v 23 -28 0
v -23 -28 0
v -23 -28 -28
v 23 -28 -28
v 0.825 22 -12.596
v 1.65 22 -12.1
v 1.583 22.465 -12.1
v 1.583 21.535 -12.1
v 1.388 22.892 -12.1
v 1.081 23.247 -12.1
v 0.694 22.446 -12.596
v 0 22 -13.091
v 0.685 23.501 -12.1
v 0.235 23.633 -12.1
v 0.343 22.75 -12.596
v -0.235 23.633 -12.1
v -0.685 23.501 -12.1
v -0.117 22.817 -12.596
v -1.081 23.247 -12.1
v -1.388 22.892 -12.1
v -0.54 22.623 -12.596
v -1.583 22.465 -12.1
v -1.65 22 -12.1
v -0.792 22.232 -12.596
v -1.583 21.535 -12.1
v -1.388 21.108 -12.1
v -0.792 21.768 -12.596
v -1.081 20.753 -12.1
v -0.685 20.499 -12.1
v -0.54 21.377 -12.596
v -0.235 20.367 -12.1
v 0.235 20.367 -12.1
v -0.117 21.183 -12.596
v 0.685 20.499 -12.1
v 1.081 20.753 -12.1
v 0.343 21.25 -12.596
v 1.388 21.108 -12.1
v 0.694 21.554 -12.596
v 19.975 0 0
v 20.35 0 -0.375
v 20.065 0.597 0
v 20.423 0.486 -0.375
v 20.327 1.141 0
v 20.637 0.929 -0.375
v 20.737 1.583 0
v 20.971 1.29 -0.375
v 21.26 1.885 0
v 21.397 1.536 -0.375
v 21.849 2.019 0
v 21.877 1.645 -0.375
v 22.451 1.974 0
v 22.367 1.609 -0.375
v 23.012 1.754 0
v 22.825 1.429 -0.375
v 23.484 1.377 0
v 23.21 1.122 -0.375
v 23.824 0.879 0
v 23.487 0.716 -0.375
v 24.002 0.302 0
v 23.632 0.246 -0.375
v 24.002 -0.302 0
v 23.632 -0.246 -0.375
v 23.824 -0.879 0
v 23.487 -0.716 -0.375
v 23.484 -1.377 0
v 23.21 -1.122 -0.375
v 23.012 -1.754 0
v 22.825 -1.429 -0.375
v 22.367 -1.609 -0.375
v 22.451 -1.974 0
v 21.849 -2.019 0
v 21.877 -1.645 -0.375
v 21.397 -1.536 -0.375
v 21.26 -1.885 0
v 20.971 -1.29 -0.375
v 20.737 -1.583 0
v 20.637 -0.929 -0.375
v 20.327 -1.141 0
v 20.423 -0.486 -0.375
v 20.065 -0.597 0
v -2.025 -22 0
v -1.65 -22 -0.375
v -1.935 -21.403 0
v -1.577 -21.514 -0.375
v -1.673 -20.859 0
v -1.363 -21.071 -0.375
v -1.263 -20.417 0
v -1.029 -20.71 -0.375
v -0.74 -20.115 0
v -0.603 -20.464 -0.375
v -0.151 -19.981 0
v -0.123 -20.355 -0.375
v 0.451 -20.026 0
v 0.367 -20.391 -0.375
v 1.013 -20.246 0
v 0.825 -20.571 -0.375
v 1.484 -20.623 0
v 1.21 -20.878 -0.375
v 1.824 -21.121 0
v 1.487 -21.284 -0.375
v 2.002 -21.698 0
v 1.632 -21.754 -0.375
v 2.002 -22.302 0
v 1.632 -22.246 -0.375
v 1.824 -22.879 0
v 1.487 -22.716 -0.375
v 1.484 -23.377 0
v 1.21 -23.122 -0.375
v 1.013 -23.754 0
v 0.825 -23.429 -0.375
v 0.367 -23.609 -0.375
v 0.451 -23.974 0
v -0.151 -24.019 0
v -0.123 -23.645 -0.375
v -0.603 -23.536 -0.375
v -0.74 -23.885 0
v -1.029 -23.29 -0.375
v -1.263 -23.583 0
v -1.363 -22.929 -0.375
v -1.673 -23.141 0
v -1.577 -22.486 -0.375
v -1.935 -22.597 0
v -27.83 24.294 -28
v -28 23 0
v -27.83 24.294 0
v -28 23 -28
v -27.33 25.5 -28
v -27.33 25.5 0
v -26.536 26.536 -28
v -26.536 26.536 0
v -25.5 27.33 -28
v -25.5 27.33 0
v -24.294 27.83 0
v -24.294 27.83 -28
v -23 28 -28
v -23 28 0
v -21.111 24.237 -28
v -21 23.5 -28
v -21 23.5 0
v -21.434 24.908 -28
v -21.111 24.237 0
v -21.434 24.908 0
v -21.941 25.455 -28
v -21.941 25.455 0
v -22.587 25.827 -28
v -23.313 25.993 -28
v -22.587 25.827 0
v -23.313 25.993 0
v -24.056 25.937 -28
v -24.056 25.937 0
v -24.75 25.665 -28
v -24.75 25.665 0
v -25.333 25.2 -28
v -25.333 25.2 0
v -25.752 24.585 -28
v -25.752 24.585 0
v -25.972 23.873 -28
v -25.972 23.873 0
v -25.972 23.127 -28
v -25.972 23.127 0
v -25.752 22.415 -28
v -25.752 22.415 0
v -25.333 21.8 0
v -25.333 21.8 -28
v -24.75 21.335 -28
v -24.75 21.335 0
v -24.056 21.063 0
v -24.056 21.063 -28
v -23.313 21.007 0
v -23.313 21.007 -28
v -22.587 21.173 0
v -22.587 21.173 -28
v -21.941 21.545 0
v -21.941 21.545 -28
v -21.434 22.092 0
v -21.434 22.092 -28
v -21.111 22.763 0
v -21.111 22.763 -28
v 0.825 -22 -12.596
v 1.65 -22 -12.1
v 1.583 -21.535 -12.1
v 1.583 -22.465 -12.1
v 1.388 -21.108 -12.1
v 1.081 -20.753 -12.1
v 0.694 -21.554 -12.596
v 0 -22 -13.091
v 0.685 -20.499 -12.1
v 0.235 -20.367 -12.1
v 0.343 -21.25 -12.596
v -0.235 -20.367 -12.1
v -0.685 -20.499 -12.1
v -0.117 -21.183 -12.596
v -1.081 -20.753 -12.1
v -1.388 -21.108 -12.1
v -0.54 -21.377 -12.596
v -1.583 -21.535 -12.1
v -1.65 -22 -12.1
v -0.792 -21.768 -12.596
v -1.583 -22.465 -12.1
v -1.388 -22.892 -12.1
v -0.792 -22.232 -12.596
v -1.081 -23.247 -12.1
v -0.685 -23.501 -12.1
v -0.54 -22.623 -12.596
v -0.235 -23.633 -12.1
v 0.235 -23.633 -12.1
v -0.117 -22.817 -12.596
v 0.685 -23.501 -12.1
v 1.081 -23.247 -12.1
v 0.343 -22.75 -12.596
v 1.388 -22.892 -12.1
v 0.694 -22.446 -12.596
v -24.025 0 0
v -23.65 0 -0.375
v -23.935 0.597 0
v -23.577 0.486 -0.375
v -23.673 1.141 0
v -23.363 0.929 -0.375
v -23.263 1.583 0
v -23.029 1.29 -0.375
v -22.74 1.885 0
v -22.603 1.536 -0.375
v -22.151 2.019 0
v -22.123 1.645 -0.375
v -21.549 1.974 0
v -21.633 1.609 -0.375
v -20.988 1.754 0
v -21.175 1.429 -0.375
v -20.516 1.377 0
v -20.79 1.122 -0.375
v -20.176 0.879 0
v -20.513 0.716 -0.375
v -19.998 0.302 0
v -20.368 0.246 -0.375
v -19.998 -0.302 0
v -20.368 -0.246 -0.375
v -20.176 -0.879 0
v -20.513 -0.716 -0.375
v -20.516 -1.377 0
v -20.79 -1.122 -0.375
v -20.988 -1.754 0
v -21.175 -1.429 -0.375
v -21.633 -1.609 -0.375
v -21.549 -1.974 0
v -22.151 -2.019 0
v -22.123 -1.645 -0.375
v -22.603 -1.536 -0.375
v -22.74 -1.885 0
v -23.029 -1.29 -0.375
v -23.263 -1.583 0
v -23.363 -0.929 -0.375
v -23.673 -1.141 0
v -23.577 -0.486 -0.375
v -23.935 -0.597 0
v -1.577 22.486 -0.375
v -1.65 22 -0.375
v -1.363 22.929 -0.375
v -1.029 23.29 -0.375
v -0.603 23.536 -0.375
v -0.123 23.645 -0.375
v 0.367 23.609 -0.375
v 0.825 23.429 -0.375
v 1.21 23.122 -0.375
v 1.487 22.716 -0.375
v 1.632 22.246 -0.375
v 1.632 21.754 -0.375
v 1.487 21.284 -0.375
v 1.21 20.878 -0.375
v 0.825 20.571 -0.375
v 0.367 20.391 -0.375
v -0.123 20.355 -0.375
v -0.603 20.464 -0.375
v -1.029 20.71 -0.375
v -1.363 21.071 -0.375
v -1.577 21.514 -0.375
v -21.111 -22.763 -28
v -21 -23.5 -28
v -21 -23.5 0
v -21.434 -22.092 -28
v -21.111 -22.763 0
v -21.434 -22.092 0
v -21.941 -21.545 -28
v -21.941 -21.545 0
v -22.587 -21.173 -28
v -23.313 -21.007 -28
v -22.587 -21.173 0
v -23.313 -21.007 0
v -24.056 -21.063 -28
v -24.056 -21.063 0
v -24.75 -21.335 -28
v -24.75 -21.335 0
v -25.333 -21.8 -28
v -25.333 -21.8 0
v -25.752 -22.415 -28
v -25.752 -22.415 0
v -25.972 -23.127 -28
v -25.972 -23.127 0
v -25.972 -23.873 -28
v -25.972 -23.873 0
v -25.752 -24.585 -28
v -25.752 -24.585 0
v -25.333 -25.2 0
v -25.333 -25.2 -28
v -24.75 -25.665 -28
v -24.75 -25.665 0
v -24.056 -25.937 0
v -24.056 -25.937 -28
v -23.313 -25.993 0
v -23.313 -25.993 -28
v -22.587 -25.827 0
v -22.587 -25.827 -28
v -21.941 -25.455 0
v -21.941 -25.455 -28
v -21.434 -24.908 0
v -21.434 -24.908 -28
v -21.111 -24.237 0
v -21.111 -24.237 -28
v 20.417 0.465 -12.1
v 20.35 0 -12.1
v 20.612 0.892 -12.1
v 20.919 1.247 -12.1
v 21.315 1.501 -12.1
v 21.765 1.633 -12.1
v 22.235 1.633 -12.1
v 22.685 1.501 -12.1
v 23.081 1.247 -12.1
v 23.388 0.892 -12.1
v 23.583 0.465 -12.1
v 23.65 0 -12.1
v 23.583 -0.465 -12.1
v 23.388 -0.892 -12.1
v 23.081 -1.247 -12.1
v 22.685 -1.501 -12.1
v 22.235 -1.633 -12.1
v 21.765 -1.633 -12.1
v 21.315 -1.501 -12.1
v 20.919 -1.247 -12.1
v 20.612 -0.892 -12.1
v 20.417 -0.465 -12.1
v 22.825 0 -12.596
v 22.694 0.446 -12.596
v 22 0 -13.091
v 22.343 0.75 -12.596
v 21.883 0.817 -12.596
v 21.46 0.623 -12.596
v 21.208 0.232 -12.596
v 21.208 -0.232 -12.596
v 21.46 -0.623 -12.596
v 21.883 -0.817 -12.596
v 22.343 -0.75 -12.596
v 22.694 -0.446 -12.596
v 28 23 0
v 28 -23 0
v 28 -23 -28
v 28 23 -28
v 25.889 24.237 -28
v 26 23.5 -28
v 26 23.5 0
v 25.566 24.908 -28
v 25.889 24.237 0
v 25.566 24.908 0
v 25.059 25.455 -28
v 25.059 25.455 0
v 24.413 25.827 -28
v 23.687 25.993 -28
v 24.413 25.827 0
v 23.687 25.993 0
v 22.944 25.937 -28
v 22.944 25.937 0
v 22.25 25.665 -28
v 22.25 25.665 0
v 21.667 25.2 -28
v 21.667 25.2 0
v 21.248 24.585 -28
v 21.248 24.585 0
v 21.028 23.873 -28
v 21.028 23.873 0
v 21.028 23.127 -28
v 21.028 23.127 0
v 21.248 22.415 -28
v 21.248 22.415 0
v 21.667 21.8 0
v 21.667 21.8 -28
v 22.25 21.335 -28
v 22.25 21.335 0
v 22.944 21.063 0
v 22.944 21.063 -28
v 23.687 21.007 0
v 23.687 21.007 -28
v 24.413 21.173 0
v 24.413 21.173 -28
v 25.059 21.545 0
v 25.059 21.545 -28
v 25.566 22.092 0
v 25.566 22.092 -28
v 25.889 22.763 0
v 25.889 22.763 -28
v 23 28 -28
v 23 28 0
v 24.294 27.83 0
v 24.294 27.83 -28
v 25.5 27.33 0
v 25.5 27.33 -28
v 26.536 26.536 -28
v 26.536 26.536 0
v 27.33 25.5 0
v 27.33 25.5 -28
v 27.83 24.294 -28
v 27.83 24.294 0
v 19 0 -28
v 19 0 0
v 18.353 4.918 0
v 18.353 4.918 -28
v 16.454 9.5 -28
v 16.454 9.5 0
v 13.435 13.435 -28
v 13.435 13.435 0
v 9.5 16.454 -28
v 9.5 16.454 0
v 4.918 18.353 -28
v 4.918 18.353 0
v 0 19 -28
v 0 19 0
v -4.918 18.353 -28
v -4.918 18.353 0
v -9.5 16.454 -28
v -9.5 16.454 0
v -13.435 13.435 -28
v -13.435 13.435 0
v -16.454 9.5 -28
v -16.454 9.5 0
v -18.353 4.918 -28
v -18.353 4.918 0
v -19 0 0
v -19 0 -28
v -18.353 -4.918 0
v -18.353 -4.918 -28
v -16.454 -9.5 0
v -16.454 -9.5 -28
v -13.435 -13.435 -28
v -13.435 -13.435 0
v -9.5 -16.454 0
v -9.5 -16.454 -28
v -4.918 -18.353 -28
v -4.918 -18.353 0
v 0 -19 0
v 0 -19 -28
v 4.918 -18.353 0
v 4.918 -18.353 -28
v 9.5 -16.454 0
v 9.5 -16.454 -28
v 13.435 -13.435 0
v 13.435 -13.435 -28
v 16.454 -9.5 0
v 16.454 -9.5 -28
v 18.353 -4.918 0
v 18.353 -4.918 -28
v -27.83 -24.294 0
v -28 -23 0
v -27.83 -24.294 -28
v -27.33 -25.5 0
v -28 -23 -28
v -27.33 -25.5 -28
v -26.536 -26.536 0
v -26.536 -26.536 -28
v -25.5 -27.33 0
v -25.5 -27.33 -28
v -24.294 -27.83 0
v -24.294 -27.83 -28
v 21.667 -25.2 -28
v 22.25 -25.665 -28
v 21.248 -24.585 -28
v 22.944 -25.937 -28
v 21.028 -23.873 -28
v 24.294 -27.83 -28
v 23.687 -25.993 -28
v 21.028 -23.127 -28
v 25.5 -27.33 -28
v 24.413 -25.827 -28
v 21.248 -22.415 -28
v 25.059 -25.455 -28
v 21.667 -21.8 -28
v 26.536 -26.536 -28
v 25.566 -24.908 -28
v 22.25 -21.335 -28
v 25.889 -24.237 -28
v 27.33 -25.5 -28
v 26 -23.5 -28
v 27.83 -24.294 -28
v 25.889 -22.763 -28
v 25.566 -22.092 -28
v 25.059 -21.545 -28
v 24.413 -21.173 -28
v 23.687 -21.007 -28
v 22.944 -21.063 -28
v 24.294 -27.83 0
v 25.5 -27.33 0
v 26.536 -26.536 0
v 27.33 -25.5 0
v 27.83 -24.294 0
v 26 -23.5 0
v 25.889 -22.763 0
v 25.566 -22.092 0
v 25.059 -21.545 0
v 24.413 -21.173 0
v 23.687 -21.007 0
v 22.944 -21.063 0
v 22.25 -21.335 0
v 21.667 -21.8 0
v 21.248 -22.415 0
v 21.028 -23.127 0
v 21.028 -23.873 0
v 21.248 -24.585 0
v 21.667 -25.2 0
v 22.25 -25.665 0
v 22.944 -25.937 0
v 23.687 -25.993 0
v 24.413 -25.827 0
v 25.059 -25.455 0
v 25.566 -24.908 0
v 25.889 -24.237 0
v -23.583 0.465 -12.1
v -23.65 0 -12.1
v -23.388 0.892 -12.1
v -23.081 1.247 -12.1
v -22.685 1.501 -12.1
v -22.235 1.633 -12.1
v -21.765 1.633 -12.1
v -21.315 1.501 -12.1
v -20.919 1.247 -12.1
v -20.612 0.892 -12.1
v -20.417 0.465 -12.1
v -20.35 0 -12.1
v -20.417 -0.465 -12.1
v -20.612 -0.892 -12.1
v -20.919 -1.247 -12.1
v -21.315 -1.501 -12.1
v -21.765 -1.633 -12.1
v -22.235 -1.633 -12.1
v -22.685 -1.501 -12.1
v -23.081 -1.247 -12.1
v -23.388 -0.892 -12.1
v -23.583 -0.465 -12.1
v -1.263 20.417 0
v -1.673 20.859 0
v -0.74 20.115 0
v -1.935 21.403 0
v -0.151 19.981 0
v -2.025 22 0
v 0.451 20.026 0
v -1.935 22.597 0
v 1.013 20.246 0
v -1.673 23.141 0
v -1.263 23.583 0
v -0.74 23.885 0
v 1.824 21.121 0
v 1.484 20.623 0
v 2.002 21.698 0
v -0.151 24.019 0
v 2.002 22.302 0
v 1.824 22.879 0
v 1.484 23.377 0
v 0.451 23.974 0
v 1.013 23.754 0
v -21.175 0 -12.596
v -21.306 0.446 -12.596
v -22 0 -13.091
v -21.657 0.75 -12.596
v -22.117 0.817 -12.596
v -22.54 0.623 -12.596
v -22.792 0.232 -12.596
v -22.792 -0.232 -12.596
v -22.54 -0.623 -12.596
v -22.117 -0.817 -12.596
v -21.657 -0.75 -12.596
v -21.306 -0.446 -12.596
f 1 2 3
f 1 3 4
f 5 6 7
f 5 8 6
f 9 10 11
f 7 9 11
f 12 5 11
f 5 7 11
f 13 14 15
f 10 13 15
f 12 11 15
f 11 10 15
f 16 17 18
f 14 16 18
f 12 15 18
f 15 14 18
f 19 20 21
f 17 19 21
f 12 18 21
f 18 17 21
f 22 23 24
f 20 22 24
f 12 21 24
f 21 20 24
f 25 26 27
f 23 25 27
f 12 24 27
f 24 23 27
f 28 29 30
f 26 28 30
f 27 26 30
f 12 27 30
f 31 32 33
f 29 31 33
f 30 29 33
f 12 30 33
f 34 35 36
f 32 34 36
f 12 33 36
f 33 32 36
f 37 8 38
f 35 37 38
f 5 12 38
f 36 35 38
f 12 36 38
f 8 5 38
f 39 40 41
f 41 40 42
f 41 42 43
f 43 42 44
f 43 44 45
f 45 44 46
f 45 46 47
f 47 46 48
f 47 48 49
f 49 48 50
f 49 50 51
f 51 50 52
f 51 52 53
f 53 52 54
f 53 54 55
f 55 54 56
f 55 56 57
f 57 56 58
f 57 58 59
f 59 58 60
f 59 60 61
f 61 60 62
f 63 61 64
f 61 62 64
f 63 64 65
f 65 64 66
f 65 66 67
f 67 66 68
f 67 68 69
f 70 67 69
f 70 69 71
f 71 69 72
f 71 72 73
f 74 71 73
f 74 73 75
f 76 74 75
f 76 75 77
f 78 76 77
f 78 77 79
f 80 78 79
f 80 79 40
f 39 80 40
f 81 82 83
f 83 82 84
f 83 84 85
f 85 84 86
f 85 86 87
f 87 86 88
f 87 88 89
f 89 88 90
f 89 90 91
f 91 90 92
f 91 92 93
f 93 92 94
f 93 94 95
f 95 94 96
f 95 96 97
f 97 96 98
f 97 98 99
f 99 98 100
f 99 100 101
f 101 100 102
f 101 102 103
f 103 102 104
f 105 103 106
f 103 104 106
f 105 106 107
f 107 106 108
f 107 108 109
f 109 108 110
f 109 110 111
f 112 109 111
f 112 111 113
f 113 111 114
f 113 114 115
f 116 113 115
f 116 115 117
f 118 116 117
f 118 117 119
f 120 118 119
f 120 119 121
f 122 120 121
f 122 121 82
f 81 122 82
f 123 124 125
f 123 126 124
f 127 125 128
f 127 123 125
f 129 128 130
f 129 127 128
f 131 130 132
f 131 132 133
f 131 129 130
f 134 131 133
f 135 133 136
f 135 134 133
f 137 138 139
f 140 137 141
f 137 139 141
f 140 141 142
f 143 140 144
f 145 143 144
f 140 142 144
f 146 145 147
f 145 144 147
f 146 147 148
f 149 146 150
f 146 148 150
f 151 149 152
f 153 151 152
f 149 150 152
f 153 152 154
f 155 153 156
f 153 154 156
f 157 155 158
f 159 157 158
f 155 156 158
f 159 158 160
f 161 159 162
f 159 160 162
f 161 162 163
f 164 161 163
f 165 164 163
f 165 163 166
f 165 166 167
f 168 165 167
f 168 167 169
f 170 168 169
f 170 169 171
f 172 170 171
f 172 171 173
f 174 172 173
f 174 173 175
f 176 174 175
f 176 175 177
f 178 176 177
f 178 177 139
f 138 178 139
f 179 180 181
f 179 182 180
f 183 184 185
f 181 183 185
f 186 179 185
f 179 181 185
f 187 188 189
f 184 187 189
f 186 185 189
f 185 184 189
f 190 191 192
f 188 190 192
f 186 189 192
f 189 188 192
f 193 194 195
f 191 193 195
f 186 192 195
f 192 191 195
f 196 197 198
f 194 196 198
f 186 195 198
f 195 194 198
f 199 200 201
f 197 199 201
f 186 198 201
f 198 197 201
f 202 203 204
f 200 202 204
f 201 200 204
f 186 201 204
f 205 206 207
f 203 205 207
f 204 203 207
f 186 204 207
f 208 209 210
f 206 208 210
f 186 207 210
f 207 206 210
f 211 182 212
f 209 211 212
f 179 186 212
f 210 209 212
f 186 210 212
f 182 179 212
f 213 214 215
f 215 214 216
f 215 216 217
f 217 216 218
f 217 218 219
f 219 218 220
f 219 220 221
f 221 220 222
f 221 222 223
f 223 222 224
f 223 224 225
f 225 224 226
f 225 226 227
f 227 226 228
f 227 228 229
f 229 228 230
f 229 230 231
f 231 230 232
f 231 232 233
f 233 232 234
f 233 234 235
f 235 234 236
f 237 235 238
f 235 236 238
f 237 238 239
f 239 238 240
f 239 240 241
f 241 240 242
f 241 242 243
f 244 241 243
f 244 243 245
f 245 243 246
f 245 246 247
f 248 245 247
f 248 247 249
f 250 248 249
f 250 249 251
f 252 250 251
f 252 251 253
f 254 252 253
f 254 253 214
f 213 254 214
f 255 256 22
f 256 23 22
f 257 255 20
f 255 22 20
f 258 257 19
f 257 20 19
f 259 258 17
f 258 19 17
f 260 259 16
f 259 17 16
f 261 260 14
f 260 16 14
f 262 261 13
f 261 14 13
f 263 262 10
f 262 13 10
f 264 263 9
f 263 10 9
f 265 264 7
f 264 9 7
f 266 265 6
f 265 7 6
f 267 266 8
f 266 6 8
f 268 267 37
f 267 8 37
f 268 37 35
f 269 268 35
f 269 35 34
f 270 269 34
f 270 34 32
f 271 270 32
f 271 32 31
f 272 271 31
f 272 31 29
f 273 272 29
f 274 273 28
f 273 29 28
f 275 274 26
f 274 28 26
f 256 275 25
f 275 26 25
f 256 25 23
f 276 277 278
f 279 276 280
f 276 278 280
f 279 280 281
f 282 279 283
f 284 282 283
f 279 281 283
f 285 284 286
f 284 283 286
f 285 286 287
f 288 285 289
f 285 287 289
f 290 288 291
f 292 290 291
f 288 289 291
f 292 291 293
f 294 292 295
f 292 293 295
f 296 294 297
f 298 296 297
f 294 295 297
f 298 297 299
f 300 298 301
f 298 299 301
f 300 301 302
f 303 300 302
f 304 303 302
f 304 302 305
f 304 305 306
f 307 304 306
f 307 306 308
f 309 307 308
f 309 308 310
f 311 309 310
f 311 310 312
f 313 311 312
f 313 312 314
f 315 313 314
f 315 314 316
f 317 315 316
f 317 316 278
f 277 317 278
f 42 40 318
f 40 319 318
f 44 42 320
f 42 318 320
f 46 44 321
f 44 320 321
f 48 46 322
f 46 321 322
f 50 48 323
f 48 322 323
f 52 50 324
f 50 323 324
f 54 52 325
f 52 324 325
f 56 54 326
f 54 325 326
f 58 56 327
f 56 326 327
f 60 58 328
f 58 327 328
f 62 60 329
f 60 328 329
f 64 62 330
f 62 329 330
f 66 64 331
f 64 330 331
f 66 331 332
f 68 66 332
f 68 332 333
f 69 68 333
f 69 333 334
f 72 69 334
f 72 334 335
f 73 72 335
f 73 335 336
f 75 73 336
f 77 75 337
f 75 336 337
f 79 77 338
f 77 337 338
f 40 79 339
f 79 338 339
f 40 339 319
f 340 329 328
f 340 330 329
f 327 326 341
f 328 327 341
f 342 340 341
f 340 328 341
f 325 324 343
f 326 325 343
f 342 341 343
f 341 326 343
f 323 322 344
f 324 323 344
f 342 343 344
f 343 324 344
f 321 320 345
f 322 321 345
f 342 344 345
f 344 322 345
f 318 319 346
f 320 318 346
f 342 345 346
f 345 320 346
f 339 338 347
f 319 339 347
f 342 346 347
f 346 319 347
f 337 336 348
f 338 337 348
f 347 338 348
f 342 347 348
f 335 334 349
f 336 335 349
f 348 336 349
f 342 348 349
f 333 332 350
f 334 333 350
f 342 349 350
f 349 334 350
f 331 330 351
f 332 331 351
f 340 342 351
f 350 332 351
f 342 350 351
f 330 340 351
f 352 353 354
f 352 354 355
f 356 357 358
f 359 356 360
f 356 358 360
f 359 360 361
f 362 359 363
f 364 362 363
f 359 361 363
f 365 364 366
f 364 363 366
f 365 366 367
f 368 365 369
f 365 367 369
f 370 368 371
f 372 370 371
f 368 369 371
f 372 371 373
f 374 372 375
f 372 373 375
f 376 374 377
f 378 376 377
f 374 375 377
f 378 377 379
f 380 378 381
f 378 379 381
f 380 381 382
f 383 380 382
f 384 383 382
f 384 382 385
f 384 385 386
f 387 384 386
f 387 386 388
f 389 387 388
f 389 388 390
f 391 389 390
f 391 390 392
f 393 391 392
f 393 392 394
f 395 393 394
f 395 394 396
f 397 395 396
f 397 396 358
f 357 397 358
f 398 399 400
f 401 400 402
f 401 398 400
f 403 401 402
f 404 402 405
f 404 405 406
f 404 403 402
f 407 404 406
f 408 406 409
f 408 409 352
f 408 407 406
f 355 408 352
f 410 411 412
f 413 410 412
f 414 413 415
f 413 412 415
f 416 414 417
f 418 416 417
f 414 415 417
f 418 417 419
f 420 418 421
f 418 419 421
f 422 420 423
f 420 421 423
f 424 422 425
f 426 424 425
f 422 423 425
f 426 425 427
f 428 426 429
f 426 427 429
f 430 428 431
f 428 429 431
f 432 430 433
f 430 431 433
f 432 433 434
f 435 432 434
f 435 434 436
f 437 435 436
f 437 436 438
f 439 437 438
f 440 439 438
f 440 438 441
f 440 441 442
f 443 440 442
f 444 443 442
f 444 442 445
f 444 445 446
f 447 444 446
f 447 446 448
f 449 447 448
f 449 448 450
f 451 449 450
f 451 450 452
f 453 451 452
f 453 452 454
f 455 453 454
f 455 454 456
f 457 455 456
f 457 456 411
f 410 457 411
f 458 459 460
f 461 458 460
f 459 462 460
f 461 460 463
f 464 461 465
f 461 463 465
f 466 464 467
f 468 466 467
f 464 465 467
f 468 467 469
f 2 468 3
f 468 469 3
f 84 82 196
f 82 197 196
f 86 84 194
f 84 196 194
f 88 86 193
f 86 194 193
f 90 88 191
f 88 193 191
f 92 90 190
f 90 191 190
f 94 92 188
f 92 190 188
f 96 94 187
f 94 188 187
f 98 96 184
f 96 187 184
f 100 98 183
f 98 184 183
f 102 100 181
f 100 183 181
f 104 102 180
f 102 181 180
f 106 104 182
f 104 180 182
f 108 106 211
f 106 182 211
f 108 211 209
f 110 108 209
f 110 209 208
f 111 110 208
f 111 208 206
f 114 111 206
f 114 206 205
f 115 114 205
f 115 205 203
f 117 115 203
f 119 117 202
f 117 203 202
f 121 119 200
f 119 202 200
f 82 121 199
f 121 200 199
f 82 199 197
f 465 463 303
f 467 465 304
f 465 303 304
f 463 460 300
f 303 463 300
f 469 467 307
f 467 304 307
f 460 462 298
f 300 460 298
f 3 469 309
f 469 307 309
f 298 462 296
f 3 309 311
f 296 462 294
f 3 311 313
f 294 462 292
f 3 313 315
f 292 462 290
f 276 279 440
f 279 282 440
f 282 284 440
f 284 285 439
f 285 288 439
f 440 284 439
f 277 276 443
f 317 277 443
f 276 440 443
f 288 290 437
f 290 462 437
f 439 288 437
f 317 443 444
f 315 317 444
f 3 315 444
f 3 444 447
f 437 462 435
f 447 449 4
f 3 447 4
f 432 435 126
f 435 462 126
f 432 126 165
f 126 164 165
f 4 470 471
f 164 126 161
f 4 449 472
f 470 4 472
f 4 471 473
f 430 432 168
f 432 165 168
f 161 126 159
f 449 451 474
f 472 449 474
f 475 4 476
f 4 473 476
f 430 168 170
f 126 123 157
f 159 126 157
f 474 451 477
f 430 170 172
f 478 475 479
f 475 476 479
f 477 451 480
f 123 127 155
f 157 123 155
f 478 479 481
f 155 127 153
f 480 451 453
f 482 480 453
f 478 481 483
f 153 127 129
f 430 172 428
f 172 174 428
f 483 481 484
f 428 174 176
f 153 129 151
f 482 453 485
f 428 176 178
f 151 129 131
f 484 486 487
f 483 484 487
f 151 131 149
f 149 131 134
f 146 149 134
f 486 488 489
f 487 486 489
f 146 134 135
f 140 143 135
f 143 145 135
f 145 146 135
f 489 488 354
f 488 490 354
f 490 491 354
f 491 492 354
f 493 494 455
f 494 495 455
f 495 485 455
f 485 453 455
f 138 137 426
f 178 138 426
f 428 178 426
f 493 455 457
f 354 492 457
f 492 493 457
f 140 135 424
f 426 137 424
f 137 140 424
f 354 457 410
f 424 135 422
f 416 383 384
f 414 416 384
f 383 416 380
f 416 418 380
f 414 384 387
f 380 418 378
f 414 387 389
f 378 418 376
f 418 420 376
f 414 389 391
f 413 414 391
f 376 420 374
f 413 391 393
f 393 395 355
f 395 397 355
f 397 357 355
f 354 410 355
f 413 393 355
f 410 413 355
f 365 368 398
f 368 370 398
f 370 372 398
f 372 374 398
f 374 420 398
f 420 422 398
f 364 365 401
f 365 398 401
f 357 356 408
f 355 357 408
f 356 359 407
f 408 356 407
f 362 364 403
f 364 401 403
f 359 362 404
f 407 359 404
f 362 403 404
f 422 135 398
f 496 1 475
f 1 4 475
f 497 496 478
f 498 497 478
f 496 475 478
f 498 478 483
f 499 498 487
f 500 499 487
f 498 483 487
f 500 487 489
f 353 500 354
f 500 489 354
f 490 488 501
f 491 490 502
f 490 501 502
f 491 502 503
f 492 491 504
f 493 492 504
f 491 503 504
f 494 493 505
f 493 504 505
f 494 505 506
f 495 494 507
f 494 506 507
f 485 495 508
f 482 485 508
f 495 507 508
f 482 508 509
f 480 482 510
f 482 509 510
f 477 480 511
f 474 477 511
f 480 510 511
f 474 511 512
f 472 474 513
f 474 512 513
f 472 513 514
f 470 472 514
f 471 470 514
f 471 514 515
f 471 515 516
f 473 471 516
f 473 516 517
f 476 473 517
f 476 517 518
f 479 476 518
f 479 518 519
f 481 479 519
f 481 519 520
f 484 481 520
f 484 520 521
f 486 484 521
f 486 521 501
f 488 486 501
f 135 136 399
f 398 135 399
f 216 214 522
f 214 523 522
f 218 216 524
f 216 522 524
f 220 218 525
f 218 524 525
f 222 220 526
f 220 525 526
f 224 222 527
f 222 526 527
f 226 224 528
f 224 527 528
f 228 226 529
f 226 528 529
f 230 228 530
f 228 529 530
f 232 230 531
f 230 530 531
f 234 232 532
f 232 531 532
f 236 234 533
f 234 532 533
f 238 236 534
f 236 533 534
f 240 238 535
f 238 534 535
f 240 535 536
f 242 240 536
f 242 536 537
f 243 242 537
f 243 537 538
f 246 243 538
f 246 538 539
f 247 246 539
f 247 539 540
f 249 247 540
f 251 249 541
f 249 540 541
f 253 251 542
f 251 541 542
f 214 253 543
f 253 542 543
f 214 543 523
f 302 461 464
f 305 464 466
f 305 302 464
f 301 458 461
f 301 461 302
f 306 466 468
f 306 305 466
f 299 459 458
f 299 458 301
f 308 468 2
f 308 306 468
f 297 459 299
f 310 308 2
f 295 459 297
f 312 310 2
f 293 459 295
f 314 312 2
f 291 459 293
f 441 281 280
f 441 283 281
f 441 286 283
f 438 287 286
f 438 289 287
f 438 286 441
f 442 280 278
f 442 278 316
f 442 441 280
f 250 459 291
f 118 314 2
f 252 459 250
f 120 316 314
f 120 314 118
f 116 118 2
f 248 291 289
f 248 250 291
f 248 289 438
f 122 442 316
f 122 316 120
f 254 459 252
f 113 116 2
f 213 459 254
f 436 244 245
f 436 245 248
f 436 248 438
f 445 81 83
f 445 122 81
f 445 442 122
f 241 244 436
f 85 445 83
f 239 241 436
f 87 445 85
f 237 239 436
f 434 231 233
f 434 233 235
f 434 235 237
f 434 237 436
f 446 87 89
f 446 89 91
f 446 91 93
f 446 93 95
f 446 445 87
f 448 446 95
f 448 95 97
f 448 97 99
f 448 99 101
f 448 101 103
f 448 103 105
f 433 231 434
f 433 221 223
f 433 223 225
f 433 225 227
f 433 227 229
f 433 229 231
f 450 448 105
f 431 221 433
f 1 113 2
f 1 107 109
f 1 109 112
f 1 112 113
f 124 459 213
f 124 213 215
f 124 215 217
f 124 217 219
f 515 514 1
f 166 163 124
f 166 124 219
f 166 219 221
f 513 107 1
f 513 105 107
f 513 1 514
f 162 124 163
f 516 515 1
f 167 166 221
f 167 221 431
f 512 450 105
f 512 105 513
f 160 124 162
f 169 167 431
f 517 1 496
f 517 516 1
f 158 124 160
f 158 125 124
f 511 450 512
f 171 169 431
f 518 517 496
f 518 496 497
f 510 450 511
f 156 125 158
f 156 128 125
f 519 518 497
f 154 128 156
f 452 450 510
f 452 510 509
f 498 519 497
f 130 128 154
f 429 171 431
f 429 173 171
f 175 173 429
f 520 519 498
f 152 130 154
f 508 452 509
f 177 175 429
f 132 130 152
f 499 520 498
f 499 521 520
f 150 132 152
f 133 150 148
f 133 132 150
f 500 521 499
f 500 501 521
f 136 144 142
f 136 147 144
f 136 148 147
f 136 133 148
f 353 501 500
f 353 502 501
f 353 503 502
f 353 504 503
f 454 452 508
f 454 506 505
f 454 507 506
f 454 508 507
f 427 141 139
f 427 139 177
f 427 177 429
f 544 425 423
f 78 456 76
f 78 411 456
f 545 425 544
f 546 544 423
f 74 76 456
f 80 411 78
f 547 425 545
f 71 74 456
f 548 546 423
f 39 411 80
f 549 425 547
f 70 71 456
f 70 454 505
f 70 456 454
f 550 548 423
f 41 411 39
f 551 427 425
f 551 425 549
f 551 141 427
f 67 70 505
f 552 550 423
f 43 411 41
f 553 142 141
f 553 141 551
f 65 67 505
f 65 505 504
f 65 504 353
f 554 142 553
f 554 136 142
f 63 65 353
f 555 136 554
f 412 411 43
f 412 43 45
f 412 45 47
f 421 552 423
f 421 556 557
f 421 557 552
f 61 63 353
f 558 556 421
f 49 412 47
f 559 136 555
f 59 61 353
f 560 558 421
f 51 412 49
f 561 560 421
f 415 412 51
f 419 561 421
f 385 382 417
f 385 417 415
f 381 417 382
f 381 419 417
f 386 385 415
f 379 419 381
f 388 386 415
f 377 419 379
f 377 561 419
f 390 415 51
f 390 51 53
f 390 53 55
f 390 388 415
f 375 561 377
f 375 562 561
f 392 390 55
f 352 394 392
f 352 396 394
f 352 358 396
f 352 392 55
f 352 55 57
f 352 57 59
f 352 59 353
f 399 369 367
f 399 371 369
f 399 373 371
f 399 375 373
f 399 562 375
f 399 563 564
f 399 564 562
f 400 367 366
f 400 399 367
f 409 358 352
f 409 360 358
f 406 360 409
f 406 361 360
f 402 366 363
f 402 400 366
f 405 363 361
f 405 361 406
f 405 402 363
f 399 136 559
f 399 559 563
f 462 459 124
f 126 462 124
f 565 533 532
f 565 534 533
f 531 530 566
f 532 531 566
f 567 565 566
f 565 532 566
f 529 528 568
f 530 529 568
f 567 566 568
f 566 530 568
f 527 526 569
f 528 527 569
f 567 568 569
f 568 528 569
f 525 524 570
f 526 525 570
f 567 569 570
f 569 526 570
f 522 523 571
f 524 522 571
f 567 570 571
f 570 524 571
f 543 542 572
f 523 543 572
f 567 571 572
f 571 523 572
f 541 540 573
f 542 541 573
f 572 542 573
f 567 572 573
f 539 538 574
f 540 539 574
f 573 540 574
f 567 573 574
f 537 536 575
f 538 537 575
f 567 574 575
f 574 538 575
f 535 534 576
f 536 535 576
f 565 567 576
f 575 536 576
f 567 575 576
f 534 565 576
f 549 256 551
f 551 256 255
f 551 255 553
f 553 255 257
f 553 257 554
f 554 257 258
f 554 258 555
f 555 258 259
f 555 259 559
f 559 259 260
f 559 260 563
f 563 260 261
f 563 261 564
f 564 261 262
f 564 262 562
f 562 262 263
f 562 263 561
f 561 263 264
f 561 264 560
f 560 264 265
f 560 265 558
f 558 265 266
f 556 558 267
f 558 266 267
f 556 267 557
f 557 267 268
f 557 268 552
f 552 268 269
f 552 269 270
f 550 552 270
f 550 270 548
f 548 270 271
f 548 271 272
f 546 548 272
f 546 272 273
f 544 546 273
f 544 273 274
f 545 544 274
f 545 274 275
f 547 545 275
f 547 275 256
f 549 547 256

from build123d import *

# Parameters (mm, degrees)
SKETCH1_W                       = 56
SKETCH1_H                       = 56
BASE_FLANGE1_DEPTH              = 28
SKETCH6_R                       = 19
SKETCH6_R_2                     = 2.5
CUT_EXTRUDE1_DEPTH              = 49.497422612
FILLET1_R                       = 5
M4X0_7_TAPPED_HOLE1_D           = 3.3
M4X0_7_TAPPED_HOLE1_DEPTH       = 12.1
M4X0_7_TAPPED_HOLE1_CSINK_D     = 4.05
M4X0_7_TAPPED_HOLE1_CSINK_ANGLE = 90
M4X0_7_TAPPED_HOLE1_TIP         = 0.991420021


# Sheet-metal steps are written as plain solids
with BuildPart() as part:
    # Sketch1 → Base-Flange1 (new body)
    with BuildSketch(Plane.XY):
        Rectangle(SKETCH1_W, SKETCH1_H)
    extrude(amount=-BASE_FLANGE1_DEPTH)

    # Sketch6 → Cut-Extrude1 (cut, through all)
    with BuildSketch(Plane.XY):
        Circle(SKETCH6_R)
        with Locations((-23.5, 23.5)):
            Circle(SKETCH6_R_2)
        with Locations((23.5, 23.5)):
            Circle(SKETCH6_R_2)
        with Locations((23.5, -23.5)):
            Circle(SKETCH6_R_2)
        with Locations((-23.5, -23.5)):
            Circle(SKETCH6_R_2)
    extrude(amount=-CUT_EXTRUDE1_DEPTH, mode=Mode.SUBTRACT)

    # Fillet1
    fillet1_edges = [part.edges().sort_by_distance(p)[0] for p in [
        (28, -28, -14),
        (-28, -28, -14),
        (-28, 28, -14),
        (28, 28, -14),
    ]]
    fillet(fillet1_edges, radius=FILLET1_R)

    # M4x0.7 Tapped Hole1
    with Locations(Plane.XY):
        with Locations((0, 22), (-22, 0), (0, -22), (22, 0)):
            CounterSinkHole(M4X0_7_TAPPED_HOLE1_D / 2, M4X0_7_TAPPED_HOLE1_CSINK_D / 2, depth=M4X0_7_TAPPED_HOLE1_DEPTH, counter_sink_angle=M4X0_7_TAPPED_HOLE1_CSINK_ANGLE)
            with Locations((0, 0, -(M4X0_7_TAPPED_HOLE1_DEPTH + M4X0_7_TAPPED_HOLE1_TIP / 2))):  # 118° drill point
                Cone(0, M4X0_7_TAPPED_HOLE1_D / 2, M4X0_7_TAPPED_HOLE1_TIP, mode=Mode.SUBTRACT)


solid = part.part
